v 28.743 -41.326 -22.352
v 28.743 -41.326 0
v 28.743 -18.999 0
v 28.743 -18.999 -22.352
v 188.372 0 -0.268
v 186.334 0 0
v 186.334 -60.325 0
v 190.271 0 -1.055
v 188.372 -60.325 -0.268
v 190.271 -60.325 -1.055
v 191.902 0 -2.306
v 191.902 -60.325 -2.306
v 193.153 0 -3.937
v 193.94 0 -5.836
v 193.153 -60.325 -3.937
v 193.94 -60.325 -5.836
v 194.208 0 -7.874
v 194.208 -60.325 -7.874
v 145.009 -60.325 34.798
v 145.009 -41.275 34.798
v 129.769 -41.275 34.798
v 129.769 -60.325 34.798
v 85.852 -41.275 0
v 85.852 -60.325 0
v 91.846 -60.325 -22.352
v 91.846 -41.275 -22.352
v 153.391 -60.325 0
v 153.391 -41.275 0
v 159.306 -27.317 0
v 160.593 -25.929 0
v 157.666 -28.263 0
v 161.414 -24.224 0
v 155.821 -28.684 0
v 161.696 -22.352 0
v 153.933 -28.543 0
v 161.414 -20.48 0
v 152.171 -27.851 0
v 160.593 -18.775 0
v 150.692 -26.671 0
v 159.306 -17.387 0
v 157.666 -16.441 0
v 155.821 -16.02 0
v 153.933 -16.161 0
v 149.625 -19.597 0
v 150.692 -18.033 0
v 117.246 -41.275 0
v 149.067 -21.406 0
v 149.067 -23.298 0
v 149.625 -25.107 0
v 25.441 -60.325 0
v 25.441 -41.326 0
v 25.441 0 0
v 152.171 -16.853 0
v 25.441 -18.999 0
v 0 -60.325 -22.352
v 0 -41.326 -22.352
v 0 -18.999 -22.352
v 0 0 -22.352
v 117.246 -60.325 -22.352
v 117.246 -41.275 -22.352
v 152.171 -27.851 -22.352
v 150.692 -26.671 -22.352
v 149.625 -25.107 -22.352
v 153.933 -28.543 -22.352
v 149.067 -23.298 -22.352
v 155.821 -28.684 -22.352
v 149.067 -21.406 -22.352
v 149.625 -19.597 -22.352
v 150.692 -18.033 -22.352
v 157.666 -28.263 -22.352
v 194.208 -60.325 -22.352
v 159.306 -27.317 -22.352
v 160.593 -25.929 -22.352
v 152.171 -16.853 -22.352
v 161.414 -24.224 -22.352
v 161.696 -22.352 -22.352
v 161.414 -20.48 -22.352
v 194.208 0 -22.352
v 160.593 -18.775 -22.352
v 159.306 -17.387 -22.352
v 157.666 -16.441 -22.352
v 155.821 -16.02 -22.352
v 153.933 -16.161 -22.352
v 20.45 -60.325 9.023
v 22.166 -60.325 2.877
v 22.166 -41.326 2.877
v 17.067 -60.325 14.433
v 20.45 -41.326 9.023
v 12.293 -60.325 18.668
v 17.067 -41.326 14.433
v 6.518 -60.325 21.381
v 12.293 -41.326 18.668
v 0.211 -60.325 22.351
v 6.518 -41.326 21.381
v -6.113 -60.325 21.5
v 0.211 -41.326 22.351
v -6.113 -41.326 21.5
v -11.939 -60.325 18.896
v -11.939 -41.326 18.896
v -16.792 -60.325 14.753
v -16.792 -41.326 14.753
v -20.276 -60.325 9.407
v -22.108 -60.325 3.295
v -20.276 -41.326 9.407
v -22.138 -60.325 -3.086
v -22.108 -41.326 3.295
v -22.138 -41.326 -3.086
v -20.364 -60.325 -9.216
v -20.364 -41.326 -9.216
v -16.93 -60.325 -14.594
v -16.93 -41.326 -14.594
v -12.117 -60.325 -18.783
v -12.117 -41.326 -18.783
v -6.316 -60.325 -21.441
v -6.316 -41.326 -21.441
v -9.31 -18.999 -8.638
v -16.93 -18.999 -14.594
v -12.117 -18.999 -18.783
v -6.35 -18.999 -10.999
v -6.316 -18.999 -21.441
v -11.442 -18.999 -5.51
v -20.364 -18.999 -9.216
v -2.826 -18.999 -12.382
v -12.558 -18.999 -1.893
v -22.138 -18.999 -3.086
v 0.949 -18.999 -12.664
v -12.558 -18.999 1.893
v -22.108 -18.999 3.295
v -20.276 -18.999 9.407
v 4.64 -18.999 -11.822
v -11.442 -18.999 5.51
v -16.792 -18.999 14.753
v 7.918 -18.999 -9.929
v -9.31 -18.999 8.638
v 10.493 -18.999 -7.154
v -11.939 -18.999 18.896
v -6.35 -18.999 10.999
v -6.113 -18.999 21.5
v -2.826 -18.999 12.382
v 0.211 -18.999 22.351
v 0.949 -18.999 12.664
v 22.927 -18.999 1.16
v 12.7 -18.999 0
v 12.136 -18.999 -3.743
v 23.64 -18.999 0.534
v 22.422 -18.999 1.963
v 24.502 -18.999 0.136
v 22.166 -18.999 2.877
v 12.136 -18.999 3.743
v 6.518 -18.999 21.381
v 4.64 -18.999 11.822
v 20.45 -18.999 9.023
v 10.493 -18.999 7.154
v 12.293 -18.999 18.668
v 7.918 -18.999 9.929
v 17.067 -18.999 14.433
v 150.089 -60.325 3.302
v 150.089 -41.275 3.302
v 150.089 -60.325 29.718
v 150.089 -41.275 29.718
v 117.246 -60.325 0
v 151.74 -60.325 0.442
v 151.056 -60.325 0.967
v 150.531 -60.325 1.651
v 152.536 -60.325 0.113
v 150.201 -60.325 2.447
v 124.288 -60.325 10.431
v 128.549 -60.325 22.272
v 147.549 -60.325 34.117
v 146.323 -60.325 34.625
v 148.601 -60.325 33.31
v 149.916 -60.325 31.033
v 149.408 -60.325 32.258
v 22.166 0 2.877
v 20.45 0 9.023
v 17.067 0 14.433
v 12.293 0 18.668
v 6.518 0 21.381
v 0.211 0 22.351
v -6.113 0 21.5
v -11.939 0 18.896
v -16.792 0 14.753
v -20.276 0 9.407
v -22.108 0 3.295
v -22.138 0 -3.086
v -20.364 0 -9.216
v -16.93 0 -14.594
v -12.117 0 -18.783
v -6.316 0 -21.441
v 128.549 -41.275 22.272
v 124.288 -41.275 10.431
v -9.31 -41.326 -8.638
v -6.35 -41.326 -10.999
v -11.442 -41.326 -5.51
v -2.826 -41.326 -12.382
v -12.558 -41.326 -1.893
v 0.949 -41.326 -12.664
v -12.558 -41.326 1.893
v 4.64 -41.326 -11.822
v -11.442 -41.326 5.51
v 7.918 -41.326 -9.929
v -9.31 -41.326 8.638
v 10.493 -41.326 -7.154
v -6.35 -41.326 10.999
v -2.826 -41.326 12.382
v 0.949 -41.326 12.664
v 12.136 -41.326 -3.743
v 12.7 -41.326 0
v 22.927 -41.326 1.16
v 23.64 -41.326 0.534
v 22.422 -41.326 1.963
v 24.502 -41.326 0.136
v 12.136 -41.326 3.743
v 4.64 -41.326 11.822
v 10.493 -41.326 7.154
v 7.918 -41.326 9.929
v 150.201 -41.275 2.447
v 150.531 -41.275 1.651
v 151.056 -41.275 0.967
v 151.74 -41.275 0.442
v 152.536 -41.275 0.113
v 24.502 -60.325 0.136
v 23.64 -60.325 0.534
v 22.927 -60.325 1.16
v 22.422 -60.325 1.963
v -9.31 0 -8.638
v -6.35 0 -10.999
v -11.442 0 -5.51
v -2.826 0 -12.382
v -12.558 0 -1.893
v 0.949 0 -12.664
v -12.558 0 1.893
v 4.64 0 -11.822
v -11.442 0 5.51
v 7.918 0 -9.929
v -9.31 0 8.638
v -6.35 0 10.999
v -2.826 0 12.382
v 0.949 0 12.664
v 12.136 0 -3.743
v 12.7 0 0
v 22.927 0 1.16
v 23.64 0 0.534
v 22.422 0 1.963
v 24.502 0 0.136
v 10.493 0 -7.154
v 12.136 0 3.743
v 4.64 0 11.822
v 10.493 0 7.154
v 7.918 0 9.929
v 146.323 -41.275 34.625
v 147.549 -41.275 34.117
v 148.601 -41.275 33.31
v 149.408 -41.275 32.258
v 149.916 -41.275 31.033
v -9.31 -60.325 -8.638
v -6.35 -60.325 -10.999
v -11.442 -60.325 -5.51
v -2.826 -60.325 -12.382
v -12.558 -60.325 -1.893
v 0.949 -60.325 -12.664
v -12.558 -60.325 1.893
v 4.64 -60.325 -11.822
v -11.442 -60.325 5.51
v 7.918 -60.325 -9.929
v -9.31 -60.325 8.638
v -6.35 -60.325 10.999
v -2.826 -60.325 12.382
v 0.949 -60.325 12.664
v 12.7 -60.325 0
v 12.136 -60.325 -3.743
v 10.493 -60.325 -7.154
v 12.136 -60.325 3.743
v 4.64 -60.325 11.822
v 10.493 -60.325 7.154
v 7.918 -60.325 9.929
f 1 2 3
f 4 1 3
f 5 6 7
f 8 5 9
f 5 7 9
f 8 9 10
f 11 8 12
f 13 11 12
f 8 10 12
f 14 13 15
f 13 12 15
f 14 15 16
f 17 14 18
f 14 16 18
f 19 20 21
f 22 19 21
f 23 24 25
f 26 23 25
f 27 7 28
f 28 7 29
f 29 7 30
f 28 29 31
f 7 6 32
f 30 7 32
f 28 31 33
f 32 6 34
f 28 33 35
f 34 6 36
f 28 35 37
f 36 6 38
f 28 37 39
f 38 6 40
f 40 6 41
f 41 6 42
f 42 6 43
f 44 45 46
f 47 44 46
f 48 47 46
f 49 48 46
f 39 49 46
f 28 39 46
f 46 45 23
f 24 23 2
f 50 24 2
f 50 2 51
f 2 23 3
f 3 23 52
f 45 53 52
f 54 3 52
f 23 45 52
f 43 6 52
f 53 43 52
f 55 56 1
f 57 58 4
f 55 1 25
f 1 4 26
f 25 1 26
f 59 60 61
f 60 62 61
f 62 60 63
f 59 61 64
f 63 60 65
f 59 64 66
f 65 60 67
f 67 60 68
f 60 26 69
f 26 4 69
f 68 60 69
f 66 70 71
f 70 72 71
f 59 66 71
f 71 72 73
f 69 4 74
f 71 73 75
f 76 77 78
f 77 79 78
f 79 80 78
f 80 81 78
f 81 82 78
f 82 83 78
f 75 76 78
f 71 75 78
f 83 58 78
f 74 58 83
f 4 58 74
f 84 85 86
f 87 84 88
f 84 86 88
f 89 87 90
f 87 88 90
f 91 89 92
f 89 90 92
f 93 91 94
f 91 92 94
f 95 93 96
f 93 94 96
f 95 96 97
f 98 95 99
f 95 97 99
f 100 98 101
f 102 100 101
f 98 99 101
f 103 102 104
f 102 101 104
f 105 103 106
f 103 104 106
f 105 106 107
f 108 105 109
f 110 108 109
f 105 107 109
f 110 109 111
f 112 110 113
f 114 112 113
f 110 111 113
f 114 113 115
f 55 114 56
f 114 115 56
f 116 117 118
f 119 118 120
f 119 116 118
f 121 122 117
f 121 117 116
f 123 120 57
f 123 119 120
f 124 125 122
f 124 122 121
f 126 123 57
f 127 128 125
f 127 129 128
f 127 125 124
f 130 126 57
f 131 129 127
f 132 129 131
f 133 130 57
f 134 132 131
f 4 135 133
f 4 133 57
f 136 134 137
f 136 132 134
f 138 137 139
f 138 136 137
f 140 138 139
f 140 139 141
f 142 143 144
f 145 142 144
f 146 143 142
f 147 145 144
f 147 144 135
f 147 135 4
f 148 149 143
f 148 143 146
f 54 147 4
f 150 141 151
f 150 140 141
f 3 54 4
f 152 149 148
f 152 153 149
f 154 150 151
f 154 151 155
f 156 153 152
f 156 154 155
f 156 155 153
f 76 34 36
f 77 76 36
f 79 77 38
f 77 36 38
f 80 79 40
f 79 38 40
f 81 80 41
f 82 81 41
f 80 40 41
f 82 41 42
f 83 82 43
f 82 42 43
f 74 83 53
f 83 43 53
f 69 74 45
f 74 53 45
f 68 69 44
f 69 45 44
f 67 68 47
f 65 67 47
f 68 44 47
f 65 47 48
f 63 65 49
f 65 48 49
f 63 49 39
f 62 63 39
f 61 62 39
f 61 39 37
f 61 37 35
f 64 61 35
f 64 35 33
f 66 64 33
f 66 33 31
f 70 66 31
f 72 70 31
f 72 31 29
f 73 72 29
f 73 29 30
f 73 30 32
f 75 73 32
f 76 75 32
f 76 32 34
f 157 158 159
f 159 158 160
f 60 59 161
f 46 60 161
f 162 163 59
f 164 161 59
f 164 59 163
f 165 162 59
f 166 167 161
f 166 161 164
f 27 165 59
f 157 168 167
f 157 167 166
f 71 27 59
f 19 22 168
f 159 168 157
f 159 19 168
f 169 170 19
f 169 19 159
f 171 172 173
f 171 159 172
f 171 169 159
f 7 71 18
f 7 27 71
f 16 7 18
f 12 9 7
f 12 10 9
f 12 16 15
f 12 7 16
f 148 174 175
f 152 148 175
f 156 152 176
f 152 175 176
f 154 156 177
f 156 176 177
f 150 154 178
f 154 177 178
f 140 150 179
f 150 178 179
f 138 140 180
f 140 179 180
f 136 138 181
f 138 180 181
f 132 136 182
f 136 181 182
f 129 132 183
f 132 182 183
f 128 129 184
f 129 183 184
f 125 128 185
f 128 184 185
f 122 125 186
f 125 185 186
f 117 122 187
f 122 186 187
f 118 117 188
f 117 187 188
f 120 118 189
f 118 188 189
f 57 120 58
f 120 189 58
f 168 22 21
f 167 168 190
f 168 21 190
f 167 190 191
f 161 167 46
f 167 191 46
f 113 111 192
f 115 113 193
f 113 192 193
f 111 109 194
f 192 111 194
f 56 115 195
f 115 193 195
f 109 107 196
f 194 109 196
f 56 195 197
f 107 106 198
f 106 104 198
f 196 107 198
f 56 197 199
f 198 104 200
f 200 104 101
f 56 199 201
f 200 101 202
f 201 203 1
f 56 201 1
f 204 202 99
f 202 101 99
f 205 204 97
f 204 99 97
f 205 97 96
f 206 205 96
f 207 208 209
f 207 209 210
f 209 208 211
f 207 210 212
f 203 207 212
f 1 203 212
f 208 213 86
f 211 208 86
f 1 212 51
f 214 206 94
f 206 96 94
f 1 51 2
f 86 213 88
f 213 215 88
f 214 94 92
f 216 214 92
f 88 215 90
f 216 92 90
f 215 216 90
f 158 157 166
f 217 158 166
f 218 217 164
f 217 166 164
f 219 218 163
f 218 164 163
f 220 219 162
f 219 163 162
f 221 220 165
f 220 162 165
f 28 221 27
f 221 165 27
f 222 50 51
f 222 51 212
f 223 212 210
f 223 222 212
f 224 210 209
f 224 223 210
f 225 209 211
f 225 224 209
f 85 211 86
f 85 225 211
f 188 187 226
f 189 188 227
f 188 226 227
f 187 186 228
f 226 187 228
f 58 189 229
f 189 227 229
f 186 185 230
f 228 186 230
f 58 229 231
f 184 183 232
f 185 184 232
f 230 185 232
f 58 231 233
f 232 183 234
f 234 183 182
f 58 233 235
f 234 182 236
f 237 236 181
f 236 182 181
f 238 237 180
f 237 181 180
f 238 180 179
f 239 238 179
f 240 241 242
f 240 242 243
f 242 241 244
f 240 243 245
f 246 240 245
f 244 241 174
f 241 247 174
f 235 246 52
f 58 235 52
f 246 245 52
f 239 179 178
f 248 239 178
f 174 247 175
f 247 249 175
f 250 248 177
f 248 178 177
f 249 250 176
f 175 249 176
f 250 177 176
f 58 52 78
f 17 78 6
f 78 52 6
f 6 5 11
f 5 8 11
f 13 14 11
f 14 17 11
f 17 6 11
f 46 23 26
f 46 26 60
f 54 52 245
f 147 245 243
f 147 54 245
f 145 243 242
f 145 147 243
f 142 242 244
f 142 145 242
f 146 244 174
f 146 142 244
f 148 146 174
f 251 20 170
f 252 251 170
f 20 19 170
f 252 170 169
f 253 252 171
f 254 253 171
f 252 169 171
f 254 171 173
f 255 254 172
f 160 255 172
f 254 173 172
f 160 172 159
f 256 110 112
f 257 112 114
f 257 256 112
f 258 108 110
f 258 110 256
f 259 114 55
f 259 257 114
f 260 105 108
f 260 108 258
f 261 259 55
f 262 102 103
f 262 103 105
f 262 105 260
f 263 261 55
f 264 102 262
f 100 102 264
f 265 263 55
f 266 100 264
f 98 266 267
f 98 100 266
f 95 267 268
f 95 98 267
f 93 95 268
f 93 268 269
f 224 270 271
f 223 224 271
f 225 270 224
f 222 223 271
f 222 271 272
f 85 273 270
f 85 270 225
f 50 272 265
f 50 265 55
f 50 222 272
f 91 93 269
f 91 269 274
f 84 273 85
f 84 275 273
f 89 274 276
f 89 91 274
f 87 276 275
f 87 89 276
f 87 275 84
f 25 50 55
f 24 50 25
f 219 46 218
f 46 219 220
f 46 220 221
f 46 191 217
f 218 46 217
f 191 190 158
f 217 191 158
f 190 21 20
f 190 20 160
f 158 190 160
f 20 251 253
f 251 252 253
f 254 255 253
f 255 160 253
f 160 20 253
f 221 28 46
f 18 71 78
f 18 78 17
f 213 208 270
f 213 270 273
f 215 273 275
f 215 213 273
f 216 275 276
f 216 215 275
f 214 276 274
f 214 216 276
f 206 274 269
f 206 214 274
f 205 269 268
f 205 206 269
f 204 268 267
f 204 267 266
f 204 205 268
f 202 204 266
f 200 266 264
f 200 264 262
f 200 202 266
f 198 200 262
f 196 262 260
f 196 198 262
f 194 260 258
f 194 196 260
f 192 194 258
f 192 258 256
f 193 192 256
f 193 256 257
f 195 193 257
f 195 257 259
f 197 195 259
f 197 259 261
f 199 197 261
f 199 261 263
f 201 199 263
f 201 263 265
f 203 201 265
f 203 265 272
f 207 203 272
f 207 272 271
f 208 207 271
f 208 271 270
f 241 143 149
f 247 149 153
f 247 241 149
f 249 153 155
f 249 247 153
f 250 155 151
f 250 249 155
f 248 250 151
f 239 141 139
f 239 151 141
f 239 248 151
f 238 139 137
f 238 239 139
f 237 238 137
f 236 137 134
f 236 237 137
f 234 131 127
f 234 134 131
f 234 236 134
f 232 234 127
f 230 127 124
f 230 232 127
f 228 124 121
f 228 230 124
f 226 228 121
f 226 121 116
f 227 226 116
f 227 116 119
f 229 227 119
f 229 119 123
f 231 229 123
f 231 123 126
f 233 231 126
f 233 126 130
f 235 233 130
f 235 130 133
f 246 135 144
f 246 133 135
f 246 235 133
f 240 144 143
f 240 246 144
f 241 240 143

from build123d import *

# Parameters (mm, degrees)
F0_R      = 12.7
F1_DEPTH  = 60.325
F2_R      = 3.302
F3_W      = 57.4852150798
F3_H      = 22.3266
F4_DEPTH  = 57.151
F3_W_2    = 22.8455264698
F3_H_2    = 41.275
F3_W_3    = 20.32
F3_W_4    = 13.4658747114
F5_DEPTH  = 34.798
F6_R      = 6.35
F7_DEPTH  = 22.353
F8_R      = 5.08
F9_R      = 7.874
F11_DEPTH = 19.05


with BuildPart() as f1:
    # F0 (on Front) → F1 (new body)
    with BuildSketch(Plane.XZ):
        with BuildLine():
            Line((117.2464, 0), (22.352, 0))
            ThreePointArc((22.352, 0), (-15.8052507731, 15.8052507731), (0, -22.352))
            Line((0, -22.352), (194.2084, -22.352))
            Line((194.2084, -22.352), (194.2084, 0))
            Line((194.2084, 0), (150.0886, 0))
            Line((150.0886, 0), (150.0886, 34.798))
            Line((150.0886, 34.798), (129.7686, 34.798))
            ThreePointArc((129.7686, 34.798), (126.786603396, 16.2190014787), (117.2464, 0))
        make_face()
        Circle(F0_R, mode=Mode.SUBTRACT)
    extrude(amount=F1_DEPTH)

    # F2
    f2_edges = [f1.edges().sort_by_distance(p)[0] for p in [
        (22.352, -30.1625, 0),
        (150.0886, -30.1625, 0),
    ]]
    fillet(f2_edges, radius=F2_R)

    # F3 (on face) → F4 (cut, through all)
    with BuildSketch(Plane.XY.offset(34.798)):
        with Locations((0, -30.1625)):
            Rectangle(F3_W, F3_H)
    extrude(amount=-F4_DEPTH, mode=Mode.SUBTRACT)

    # F3 (on face) → F5 (cut, through all)
    with BuildSketch(Plane.XY.offset(34.798)):
        with Locations((118.3458367651, -20.6375)):
            Rectangle(F3_W_2, F3_H_2)
        with Locations((139.9286, -20.6375)):
            Rectangle(F3_W_3, F3_H_2)
        with Locations((156.8215373557, -20.6375)):
            Rectangle(F3_W_4, F3_H_2)
    extrude(amount=-F5_DEPTH, mode=Mode.SUBTRACT)

    # F6 (on face) → F7 (cut, through all)
    with BuildSketch(Plane.XY):
        with Locations((155.3464, -22.352)):
            Circle(F6_R)
    extrude(amount=-F7_DEPTH, mode=Mode.SUBTRACT)

    # F8
    f8_edges = [f1.edges().sort_by_distance(p)[0] for p in [
        (150.0886, -50.8, 34.798),
    ]]
    fillet(f8_edges, radius=F8_R)

    # F9
    f9_edges = [f1.edges().sort_by_distance(p)[0] for p in [
        (194.2084, -30.1625, 0),
    ]]
    fillet(f9_edges, radius=F9_R)

    # F10 (on face) → F11 (cut)
    with BuildSketch(Plane.XZ.offset(60.325)):
        Polygon((117.2464, -22.352), (117.2464, 0), (85.852, 0), (91.8464, -22.352), align=None)
    extrude(amount=-F11_DEPTH, mode=Mode.SUBTRACT)


solid = f1.part
